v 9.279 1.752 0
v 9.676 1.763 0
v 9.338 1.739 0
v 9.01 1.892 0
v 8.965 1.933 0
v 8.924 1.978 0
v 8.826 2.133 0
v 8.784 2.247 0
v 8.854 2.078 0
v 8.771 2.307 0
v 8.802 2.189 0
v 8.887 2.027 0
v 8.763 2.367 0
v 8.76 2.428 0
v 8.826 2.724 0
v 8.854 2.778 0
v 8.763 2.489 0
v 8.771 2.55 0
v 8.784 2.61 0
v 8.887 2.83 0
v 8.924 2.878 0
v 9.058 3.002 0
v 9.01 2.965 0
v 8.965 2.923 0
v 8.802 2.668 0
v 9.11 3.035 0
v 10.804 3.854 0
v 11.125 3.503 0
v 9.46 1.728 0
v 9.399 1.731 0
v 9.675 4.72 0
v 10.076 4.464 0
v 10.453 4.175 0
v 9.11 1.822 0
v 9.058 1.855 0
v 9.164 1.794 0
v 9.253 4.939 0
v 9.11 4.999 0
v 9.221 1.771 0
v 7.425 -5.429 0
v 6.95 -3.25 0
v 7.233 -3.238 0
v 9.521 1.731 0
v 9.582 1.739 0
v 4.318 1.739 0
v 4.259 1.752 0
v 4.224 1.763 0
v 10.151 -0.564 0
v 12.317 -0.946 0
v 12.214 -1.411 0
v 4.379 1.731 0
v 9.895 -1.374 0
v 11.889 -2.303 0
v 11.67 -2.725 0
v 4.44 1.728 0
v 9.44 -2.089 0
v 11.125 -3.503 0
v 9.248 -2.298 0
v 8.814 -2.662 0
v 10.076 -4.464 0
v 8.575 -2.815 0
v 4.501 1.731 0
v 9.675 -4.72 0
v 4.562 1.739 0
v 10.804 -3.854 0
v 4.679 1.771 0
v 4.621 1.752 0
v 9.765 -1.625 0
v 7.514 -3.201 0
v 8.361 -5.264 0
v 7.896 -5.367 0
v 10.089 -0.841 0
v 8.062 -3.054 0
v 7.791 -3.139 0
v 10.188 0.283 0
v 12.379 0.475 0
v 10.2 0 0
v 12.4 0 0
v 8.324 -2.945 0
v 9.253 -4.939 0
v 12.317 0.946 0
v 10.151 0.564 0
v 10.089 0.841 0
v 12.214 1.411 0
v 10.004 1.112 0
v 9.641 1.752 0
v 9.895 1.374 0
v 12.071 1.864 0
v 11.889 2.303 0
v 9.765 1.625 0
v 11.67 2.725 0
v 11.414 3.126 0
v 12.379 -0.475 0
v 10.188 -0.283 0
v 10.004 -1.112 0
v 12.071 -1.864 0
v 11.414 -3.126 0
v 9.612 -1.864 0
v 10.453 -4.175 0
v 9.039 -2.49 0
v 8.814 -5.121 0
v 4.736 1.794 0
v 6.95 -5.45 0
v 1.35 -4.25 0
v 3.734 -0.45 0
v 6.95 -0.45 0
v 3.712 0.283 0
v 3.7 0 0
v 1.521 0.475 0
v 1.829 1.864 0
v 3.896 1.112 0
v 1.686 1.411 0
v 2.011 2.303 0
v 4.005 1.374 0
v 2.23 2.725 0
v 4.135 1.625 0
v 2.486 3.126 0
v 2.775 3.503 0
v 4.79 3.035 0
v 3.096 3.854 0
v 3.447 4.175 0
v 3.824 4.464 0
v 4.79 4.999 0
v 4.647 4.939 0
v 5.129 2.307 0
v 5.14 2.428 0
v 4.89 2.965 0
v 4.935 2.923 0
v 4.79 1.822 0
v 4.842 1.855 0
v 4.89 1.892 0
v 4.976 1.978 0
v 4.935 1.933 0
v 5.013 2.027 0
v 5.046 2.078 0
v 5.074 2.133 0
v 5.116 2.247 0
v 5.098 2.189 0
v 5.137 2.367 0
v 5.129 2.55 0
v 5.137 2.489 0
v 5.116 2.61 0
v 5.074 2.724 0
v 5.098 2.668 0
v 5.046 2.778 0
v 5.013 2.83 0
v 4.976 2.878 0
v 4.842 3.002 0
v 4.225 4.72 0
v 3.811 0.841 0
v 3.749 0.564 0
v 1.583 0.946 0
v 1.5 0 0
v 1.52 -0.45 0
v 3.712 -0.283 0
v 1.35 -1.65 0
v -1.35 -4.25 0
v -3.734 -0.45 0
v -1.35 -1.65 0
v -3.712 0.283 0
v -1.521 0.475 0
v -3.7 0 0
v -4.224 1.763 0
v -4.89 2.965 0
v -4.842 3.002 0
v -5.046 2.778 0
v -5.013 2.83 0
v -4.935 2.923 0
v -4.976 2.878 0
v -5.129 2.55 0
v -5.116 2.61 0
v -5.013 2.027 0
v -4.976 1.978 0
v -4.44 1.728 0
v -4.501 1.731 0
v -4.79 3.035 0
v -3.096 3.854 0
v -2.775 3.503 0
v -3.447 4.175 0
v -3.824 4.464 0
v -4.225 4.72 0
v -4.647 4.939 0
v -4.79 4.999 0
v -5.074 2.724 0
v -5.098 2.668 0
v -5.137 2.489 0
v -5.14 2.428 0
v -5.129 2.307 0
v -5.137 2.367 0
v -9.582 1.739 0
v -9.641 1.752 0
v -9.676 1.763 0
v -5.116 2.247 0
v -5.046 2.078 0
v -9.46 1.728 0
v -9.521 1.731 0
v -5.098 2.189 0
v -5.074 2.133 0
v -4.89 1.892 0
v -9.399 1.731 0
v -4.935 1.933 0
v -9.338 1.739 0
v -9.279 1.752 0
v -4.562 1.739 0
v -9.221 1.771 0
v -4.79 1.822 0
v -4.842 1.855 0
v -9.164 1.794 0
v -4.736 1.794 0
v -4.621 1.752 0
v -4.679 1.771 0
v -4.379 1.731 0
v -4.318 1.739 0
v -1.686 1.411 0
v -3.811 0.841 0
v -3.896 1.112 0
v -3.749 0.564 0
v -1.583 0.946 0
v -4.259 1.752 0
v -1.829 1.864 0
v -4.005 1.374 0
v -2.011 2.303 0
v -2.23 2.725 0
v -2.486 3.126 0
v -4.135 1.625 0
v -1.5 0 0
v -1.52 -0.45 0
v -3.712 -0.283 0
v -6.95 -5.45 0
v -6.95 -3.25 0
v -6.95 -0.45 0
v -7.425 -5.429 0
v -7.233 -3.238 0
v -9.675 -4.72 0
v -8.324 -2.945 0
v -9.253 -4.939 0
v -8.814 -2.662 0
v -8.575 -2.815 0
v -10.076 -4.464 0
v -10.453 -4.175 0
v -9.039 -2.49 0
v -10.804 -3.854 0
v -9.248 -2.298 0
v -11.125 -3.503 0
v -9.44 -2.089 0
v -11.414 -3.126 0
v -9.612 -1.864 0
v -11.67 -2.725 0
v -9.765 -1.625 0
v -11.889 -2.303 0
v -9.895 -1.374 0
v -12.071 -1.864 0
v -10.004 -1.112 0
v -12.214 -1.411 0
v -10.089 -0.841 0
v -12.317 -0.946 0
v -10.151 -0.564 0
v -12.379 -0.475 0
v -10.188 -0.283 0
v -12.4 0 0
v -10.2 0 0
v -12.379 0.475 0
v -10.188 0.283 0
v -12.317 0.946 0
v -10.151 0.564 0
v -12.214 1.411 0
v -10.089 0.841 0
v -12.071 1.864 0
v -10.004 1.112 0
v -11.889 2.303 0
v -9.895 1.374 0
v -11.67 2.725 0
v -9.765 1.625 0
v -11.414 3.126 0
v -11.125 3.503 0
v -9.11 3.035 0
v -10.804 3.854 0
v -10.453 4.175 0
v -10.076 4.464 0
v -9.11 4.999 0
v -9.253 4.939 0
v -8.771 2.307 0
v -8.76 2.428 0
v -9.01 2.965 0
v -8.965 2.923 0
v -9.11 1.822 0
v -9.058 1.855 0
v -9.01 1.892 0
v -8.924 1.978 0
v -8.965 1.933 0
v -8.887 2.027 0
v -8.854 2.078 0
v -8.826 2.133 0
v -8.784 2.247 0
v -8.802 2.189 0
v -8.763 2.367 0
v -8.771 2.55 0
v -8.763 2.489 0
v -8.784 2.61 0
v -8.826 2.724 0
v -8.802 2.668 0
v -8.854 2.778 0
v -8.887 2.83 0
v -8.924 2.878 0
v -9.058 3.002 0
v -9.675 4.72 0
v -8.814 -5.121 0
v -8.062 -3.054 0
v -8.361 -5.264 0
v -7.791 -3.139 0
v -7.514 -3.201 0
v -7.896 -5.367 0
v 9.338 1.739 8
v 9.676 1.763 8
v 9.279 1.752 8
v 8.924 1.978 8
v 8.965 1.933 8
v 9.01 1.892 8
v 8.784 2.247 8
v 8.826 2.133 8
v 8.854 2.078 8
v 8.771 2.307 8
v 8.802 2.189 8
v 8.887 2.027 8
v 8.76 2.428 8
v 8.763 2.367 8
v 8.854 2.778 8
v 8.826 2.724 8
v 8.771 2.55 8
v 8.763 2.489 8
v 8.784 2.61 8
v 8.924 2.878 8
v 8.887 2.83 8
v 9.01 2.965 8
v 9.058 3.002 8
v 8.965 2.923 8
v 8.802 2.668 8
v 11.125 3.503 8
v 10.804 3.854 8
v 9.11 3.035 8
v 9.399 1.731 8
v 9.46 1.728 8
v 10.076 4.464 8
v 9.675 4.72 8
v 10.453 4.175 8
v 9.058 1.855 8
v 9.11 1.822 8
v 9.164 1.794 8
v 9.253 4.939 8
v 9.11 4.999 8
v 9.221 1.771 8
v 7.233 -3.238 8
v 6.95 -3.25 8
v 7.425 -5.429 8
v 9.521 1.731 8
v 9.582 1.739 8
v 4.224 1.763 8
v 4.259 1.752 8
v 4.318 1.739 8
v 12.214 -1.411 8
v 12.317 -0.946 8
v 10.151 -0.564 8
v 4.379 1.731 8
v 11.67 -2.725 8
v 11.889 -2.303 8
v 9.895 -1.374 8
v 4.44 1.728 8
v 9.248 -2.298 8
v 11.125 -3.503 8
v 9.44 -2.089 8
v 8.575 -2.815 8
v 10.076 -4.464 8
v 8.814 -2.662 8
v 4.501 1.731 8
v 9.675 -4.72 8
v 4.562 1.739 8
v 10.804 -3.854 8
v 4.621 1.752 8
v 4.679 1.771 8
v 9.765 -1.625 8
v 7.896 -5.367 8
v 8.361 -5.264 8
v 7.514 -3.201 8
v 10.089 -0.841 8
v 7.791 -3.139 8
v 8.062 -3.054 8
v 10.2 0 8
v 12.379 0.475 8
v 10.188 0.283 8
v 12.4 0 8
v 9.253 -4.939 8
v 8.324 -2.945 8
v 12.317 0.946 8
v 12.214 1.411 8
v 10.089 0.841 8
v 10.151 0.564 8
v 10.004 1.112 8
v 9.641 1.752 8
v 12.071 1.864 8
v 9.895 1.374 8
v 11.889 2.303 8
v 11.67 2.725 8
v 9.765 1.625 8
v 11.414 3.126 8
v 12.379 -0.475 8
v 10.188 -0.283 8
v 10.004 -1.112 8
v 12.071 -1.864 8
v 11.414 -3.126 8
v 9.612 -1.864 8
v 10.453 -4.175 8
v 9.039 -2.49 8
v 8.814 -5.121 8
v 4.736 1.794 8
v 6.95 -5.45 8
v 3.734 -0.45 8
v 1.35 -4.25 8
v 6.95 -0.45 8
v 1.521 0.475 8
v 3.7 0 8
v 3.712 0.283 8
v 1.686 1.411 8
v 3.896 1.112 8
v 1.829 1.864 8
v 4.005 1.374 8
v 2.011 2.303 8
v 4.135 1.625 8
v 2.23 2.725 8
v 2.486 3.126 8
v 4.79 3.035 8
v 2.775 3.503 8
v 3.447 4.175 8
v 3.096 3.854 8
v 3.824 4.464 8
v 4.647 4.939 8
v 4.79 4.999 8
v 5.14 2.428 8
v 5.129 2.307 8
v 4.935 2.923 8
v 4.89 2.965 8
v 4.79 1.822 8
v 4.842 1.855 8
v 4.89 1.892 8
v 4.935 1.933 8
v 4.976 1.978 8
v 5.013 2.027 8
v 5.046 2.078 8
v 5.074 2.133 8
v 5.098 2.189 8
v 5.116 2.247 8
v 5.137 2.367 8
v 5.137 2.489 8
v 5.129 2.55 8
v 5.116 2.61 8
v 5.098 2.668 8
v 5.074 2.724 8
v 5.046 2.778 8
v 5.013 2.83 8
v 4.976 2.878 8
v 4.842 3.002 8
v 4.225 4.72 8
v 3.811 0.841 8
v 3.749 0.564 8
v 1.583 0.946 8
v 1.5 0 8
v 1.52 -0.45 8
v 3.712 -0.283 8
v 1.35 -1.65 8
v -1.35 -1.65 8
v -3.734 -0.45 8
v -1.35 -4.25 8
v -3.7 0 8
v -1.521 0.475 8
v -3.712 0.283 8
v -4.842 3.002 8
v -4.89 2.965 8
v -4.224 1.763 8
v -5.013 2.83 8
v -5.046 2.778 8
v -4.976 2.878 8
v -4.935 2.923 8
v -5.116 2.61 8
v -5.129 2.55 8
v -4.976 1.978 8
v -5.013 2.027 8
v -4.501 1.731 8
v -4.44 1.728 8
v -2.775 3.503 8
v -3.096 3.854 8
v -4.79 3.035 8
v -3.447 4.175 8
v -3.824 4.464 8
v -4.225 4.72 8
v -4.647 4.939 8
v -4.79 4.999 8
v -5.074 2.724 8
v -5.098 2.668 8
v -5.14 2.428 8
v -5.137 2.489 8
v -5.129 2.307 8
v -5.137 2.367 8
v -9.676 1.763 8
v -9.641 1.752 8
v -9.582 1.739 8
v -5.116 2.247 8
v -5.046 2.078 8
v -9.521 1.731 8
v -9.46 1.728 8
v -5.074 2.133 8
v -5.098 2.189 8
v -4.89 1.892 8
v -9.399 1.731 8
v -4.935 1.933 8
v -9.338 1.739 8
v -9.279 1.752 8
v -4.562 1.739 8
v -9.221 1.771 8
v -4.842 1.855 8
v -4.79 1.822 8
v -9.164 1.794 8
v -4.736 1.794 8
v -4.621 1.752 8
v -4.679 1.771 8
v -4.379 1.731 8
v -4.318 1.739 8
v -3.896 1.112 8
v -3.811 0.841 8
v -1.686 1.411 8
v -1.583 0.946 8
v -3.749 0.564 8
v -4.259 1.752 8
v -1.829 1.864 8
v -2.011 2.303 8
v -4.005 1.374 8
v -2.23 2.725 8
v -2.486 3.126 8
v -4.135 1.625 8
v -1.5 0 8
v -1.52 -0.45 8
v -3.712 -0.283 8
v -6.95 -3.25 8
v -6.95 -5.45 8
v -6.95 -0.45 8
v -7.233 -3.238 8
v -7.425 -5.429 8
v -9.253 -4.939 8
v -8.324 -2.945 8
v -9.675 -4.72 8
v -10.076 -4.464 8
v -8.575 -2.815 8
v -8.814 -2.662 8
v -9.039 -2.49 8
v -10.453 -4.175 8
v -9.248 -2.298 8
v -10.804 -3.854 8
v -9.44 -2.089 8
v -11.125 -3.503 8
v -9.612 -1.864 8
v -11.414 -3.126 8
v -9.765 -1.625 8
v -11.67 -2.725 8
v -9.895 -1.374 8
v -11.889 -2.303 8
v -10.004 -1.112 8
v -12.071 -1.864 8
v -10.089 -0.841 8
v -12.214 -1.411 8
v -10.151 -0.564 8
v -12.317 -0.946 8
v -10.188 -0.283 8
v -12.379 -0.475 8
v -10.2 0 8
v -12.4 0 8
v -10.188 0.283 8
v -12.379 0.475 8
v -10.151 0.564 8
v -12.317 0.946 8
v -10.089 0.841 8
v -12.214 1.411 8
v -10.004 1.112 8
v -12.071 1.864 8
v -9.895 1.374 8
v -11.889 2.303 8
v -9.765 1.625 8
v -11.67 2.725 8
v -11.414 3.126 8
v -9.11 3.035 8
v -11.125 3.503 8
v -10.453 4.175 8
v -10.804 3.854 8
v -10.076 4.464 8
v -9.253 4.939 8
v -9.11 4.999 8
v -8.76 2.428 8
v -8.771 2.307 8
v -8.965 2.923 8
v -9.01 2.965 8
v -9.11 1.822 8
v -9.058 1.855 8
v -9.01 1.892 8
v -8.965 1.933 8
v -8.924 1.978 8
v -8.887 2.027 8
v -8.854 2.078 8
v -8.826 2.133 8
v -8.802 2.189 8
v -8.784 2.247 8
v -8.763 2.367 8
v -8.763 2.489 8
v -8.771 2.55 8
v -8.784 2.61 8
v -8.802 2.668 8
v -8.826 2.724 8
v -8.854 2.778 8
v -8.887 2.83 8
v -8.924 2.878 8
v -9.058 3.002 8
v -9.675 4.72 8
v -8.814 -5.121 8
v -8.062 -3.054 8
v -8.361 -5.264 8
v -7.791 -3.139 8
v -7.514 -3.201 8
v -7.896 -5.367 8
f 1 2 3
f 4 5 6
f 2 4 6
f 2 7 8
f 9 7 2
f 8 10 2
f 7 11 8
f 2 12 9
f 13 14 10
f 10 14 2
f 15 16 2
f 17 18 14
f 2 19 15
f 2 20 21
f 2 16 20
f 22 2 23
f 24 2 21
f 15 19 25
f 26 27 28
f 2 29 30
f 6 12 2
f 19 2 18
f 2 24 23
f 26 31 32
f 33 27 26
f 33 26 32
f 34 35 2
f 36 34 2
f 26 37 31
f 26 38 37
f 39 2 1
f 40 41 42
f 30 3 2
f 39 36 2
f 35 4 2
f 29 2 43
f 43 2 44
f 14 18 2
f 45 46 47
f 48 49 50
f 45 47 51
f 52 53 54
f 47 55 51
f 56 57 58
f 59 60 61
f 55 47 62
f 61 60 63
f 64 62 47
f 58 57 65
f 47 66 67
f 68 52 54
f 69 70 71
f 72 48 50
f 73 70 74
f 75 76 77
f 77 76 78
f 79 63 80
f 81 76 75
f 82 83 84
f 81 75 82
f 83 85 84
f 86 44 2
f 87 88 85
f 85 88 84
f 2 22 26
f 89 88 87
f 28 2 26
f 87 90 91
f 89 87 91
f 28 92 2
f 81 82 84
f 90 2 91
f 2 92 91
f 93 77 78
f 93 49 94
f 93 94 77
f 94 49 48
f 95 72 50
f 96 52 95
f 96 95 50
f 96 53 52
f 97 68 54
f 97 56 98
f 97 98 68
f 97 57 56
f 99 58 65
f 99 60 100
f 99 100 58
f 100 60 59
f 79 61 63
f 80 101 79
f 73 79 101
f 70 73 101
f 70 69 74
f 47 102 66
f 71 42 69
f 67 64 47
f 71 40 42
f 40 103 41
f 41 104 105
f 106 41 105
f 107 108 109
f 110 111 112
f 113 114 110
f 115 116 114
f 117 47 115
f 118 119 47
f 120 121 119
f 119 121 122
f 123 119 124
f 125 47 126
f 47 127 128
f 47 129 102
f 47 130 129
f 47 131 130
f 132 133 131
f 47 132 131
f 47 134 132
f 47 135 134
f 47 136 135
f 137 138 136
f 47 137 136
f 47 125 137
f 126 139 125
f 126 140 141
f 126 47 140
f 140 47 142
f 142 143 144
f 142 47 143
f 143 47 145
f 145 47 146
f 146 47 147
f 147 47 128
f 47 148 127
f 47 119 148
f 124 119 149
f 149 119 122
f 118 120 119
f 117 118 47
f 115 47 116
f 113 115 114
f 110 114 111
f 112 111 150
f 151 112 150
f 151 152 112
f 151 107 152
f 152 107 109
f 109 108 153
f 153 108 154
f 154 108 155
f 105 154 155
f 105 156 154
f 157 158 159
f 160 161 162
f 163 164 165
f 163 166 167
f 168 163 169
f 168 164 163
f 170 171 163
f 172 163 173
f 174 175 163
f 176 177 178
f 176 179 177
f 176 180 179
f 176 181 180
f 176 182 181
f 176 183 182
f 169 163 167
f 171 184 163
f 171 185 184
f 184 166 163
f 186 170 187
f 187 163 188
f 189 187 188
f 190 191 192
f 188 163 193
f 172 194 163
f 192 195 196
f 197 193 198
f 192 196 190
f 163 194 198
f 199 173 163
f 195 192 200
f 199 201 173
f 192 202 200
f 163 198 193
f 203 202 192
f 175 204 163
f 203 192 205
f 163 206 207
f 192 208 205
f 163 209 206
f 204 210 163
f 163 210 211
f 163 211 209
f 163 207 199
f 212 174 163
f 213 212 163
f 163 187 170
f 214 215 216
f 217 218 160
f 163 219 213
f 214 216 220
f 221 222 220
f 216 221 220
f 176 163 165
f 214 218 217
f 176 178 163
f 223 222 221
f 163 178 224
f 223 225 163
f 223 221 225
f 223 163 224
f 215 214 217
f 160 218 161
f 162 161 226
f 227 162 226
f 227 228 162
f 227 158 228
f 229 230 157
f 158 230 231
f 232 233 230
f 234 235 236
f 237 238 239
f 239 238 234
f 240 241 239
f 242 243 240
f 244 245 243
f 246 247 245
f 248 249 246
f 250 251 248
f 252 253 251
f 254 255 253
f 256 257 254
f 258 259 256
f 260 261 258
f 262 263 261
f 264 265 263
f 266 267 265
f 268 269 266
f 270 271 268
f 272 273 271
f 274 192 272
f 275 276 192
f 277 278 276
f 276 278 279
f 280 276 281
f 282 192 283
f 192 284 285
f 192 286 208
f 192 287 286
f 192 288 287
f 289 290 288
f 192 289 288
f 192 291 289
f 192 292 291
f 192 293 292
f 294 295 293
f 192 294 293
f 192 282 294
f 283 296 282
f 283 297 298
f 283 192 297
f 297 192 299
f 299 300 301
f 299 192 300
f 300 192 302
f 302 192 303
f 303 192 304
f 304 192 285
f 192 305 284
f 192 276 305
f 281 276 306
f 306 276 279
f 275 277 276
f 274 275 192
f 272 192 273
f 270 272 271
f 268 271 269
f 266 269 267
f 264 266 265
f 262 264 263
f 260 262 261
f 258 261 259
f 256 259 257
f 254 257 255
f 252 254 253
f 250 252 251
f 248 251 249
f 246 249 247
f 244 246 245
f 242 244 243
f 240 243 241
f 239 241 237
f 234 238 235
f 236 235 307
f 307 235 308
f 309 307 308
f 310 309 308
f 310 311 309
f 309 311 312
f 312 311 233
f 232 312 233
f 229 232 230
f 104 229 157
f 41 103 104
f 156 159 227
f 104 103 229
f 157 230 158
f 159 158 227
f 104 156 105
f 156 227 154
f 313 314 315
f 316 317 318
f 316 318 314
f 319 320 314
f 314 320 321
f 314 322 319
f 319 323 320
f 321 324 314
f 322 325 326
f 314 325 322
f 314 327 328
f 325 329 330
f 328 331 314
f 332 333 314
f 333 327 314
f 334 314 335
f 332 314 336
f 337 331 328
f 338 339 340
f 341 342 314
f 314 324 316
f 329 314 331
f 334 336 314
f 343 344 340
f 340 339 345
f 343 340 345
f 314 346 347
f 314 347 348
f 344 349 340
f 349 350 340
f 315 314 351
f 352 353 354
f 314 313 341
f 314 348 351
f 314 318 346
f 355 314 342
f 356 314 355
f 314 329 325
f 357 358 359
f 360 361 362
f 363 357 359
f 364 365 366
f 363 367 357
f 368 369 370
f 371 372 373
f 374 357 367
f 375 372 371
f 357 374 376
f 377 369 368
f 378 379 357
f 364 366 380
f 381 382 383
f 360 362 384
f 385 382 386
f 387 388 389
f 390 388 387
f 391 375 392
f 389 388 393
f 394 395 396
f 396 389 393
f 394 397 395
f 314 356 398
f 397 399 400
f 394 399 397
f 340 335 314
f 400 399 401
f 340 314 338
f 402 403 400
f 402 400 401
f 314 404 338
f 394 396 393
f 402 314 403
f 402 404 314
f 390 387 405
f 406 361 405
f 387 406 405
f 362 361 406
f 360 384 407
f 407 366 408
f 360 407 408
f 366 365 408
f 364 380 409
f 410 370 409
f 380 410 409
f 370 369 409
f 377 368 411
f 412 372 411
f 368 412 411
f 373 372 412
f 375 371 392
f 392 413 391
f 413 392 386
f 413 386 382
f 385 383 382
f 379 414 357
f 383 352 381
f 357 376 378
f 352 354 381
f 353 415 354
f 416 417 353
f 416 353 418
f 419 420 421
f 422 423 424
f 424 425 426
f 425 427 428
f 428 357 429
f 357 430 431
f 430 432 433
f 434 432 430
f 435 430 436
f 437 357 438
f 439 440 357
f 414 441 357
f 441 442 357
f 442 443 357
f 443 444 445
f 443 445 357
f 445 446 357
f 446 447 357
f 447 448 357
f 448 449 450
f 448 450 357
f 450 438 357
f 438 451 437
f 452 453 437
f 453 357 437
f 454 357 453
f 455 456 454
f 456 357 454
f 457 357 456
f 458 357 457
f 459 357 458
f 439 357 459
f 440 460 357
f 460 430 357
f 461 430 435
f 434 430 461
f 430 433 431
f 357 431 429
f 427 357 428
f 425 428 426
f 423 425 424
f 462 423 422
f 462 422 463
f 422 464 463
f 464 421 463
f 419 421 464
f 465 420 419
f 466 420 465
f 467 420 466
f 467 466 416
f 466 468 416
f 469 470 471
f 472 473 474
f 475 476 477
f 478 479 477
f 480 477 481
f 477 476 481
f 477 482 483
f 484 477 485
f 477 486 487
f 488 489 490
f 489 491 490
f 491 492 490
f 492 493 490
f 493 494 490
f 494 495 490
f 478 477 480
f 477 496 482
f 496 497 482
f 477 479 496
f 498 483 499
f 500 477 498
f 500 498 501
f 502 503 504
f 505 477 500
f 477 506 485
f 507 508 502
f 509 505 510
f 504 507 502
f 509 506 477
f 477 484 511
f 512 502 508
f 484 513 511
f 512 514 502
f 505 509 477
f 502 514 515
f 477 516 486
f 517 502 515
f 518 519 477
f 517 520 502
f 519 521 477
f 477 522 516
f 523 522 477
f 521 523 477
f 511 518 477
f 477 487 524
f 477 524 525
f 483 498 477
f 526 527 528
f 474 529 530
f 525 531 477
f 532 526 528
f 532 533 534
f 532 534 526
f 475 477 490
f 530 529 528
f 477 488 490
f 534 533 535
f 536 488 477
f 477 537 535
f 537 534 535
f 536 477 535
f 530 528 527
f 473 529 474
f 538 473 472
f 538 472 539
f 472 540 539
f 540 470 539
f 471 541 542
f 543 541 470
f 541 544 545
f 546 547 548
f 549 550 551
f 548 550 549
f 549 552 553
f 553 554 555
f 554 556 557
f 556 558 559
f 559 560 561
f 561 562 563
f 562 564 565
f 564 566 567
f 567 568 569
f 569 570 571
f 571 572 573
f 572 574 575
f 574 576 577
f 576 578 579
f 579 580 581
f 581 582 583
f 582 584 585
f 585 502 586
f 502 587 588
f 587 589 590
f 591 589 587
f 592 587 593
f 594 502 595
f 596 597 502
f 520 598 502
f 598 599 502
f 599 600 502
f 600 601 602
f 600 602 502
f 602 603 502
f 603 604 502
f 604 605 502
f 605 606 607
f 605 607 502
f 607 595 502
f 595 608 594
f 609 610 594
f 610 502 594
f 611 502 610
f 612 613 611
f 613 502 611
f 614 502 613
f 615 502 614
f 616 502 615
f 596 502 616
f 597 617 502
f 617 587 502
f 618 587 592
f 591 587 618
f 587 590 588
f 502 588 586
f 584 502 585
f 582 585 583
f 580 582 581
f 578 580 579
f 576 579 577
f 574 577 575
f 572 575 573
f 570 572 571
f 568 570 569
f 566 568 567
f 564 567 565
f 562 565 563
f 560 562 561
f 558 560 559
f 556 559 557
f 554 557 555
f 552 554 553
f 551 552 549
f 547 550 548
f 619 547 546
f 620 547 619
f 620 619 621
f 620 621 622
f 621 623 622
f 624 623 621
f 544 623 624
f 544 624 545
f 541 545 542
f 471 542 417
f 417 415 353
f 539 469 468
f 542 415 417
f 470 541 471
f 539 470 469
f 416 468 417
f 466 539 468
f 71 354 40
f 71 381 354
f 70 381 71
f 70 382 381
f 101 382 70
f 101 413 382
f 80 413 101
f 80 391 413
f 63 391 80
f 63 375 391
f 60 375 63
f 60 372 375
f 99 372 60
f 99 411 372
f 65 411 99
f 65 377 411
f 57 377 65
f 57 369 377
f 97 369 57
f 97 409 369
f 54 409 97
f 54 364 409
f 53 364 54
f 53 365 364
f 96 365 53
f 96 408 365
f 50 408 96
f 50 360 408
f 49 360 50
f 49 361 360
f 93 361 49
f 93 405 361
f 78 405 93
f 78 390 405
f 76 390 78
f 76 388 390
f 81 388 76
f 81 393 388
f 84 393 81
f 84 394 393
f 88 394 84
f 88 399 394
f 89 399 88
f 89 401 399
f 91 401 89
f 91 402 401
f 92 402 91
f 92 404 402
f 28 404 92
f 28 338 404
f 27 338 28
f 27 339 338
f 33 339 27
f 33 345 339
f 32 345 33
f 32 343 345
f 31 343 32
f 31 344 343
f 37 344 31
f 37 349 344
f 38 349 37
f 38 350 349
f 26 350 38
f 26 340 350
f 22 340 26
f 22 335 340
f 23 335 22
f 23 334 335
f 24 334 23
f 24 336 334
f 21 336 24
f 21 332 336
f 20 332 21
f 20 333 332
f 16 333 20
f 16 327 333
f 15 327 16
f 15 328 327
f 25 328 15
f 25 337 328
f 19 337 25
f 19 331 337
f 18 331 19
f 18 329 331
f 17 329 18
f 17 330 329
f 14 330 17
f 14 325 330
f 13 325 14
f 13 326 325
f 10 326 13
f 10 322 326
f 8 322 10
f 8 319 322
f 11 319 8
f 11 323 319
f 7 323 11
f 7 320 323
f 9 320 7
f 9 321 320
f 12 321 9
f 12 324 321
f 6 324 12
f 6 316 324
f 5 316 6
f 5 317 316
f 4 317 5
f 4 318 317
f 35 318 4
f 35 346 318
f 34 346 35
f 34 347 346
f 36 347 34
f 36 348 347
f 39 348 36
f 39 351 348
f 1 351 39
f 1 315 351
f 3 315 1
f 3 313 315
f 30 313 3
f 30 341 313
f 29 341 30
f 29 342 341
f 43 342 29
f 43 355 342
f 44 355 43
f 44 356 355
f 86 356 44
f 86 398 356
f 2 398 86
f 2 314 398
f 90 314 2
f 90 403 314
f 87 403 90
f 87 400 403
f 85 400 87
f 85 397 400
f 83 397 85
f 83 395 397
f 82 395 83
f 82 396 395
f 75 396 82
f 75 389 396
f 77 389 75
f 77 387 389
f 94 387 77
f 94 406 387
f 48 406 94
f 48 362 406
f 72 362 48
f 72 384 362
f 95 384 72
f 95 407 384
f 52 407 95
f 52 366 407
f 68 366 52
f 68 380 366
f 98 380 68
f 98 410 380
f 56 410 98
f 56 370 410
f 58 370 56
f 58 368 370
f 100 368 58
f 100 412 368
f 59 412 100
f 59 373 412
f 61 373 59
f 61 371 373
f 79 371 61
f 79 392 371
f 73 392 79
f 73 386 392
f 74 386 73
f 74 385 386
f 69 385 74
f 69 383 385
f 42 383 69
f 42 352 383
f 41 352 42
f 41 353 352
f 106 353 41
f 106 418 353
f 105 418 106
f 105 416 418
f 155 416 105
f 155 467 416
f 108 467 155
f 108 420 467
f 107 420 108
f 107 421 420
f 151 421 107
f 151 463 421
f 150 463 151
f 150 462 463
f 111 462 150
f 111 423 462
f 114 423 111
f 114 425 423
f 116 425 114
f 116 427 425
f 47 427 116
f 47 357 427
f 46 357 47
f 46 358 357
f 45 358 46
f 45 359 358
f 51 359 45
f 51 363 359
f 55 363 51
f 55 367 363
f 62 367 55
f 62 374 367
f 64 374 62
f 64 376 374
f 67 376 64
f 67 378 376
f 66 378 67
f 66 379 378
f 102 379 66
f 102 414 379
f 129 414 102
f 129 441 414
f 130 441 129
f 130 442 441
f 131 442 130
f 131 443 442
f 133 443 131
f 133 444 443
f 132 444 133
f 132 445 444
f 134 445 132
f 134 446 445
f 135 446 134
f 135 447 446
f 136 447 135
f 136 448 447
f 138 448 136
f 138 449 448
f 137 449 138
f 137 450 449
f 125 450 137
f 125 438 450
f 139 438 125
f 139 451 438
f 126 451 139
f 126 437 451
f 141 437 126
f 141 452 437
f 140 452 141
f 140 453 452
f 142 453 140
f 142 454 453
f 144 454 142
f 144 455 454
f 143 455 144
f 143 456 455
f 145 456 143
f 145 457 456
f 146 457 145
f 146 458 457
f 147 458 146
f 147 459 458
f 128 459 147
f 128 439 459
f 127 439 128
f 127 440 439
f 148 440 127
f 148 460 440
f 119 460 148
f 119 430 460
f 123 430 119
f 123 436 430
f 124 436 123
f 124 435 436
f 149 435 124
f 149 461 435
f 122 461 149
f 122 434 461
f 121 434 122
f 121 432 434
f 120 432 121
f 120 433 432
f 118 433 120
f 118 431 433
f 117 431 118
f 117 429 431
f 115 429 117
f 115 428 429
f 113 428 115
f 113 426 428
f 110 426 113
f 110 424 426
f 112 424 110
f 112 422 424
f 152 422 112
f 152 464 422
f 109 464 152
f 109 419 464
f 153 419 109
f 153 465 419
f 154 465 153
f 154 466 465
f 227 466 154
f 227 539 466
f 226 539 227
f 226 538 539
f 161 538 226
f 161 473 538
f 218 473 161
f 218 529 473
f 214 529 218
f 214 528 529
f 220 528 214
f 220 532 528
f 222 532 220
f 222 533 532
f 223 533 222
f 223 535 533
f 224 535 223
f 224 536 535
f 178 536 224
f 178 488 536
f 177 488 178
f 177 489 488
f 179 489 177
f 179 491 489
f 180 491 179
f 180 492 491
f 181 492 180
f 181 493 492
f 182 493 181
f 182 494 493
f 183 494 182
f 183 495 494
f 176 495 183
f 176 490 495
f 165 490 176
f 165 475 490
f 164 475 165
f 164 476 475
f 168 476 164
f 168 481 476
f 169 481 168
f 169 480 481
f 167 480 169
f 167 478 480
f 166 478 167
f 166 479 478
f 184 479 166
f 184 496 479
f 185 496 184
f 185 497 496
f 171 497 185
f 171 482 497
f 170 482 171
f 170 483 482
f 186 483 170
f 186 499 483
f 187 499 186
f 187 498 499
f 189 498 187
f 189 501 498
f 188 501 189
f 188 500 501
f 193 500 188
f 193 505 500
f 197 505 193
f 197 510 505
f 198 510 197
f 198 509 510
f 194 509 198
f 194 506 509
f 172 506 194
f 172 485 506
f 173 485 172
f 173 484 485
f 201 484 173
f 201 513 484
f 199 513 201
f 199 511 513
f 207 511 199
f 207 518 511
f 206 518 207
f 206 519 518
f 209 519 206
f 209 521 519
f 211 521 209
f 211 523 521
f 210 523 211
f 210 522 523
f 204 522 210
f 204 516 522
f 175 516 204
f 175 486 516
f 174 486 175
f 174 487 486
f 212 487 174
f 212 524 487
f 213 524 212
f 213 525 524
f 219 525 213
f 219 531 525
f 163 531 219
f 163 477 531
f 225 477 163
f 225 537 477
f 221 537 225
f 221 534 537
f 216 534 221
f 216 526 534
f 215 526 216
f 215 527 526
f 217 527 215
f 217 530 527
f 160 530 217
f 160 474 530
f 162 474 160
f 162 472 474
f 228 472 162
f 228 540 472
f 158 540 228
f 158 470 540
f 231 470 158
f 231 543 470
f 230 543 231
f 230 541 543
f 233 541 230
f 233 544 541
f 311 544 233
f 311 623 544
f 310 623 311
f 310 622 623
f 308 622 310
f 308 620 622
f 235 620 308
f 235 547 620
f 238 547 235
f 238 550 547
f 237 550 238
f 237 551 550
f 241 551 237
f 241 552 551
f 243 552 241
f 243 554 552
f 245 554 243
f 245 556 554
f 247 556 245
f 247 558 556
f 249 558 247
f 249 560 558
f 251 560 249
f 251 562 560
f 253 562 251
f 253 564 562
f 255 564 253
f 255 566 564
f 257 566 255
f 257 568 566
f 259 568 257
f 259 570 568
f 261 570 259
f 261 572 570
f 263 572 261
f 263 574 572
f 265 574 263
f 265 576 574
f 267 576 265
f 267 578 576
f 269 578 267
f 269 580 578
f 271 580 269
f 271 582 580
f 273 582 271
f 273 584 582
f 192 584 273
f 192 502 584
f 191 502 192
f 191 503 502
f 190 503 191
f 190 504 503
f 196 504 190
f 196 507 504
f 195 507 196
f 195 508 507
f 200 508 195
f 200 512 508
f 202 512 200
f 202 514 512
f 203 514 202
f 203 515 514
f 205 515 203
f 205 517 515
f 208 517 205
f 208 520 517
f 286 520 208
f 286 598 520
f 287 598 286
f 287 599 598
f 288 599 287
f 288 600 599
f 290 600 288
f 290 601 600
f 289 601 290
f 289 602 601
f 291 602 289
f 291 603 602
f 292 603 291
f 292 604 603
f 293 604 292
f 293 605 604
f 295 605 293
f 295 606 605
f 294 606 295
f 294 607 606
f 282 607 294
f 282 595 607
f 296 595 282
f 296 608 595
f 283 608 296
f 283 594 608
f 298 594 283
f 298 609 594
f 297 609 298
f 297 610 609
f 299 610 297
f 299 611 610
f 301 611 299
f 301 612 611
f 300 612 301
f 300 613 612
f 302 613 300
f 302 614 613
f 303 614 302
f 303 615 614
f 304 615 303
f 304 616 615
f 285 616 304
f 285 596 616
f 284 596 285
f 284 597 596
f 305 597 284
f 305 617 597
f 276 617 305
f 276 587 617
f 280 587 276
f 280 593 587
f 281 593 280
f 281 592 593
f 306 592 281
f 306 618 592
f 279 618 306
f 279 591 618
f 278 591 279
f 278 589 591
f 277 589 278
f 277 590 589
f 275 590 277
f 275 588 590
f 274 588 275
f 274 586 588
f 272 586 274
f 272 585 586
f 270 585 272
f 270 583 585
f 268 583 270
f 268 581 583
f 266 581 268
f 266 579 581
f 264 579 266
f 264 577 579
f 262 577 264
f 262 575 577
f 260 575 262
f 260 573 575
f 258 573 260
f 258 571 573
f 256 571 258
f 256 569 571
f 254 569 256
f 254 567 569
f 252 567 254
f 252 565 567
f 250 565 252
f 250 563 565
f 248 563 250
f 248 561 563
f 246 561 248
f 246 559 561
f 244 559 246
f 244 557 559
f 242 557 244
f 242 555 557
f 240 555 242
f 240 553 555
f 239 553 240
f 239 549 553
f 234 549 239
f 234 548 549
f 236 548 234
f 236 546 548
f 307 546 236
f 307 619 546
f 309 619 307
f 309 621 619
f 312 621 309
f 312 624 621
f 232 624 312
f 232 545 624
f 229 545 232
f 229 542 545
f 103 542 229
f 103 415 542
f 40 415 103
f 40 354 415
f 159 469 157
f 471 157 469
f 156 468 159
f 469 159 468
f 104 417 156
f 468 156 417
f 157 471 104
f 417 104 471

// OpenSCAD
// =====================================================================
// CordClamp - double-ended snap clip
//
// Two open C-jaws on a common spine. Push a cable past the lips of a jaw
// and it snaps in and is held; use both ends to gather a loop, or to hold
// two runs side by side.
//
// Extruded flat, so every face is vertical: prints on its side with no
// supports and the layer lines run around the jaw, which is the strong
// direction for a part that has to spring open.
// =====================================================================

cable_d   = 6.0;     // cable the jaw is sized for
jaw_wall  = 2.2;     // jaw wall thickness
mouth     = 0.72;    // mouth opening as a fraction of cable_d - under 1 so it snaps
lip       = 0.7;     // retaining bulb at each mouth tip
depth     = 8.0;     // how wide the clip is (the extrusion)
spine_w   = 5.0;     // bar joining the two jaws
gap       = 3.0;     // clear space between the jaws
$fn = 72;

r_in  = cable_d / 2 + 0.25;
r_out = r_in + jaw_wall;
pitch = 2 * r_out + gap;

module jaw_2d() {
    difference() {
        circle(r = r_out);
        circle(r = r_in);
        // mouth, opening toward +Y like the reference
        translate([-cable_d * mouth / 2, 0]) square([cable_d * mouth, r_out + 1]);
    }
    // retaining bulbs so a seated cable cannot fall back out
    for (s = [-1, 1])
        translate([s * (cable_d * mouth / 2 + lip / 2), sqrt(max(r_in*r_in - pow(cable_d*mouth/2,2), 0.01))])
            circle(r = lip);
}

module clamp_2d() {
    for (s = [-1, 1]) translate([s * pitch / 2, 0]) jaw_2d();
    // spine joining them, with a lightening window
    difference() {
        translate([0, -r_out + spine_w / 2]) square([pitch, spine_w], center = true);
        translate([0, -r_out + spine_w / 2]) square([gap * 0.9, spine_w - 2.4], center = true);
    }
}

linear_extrude(depth) clamp_2d();
